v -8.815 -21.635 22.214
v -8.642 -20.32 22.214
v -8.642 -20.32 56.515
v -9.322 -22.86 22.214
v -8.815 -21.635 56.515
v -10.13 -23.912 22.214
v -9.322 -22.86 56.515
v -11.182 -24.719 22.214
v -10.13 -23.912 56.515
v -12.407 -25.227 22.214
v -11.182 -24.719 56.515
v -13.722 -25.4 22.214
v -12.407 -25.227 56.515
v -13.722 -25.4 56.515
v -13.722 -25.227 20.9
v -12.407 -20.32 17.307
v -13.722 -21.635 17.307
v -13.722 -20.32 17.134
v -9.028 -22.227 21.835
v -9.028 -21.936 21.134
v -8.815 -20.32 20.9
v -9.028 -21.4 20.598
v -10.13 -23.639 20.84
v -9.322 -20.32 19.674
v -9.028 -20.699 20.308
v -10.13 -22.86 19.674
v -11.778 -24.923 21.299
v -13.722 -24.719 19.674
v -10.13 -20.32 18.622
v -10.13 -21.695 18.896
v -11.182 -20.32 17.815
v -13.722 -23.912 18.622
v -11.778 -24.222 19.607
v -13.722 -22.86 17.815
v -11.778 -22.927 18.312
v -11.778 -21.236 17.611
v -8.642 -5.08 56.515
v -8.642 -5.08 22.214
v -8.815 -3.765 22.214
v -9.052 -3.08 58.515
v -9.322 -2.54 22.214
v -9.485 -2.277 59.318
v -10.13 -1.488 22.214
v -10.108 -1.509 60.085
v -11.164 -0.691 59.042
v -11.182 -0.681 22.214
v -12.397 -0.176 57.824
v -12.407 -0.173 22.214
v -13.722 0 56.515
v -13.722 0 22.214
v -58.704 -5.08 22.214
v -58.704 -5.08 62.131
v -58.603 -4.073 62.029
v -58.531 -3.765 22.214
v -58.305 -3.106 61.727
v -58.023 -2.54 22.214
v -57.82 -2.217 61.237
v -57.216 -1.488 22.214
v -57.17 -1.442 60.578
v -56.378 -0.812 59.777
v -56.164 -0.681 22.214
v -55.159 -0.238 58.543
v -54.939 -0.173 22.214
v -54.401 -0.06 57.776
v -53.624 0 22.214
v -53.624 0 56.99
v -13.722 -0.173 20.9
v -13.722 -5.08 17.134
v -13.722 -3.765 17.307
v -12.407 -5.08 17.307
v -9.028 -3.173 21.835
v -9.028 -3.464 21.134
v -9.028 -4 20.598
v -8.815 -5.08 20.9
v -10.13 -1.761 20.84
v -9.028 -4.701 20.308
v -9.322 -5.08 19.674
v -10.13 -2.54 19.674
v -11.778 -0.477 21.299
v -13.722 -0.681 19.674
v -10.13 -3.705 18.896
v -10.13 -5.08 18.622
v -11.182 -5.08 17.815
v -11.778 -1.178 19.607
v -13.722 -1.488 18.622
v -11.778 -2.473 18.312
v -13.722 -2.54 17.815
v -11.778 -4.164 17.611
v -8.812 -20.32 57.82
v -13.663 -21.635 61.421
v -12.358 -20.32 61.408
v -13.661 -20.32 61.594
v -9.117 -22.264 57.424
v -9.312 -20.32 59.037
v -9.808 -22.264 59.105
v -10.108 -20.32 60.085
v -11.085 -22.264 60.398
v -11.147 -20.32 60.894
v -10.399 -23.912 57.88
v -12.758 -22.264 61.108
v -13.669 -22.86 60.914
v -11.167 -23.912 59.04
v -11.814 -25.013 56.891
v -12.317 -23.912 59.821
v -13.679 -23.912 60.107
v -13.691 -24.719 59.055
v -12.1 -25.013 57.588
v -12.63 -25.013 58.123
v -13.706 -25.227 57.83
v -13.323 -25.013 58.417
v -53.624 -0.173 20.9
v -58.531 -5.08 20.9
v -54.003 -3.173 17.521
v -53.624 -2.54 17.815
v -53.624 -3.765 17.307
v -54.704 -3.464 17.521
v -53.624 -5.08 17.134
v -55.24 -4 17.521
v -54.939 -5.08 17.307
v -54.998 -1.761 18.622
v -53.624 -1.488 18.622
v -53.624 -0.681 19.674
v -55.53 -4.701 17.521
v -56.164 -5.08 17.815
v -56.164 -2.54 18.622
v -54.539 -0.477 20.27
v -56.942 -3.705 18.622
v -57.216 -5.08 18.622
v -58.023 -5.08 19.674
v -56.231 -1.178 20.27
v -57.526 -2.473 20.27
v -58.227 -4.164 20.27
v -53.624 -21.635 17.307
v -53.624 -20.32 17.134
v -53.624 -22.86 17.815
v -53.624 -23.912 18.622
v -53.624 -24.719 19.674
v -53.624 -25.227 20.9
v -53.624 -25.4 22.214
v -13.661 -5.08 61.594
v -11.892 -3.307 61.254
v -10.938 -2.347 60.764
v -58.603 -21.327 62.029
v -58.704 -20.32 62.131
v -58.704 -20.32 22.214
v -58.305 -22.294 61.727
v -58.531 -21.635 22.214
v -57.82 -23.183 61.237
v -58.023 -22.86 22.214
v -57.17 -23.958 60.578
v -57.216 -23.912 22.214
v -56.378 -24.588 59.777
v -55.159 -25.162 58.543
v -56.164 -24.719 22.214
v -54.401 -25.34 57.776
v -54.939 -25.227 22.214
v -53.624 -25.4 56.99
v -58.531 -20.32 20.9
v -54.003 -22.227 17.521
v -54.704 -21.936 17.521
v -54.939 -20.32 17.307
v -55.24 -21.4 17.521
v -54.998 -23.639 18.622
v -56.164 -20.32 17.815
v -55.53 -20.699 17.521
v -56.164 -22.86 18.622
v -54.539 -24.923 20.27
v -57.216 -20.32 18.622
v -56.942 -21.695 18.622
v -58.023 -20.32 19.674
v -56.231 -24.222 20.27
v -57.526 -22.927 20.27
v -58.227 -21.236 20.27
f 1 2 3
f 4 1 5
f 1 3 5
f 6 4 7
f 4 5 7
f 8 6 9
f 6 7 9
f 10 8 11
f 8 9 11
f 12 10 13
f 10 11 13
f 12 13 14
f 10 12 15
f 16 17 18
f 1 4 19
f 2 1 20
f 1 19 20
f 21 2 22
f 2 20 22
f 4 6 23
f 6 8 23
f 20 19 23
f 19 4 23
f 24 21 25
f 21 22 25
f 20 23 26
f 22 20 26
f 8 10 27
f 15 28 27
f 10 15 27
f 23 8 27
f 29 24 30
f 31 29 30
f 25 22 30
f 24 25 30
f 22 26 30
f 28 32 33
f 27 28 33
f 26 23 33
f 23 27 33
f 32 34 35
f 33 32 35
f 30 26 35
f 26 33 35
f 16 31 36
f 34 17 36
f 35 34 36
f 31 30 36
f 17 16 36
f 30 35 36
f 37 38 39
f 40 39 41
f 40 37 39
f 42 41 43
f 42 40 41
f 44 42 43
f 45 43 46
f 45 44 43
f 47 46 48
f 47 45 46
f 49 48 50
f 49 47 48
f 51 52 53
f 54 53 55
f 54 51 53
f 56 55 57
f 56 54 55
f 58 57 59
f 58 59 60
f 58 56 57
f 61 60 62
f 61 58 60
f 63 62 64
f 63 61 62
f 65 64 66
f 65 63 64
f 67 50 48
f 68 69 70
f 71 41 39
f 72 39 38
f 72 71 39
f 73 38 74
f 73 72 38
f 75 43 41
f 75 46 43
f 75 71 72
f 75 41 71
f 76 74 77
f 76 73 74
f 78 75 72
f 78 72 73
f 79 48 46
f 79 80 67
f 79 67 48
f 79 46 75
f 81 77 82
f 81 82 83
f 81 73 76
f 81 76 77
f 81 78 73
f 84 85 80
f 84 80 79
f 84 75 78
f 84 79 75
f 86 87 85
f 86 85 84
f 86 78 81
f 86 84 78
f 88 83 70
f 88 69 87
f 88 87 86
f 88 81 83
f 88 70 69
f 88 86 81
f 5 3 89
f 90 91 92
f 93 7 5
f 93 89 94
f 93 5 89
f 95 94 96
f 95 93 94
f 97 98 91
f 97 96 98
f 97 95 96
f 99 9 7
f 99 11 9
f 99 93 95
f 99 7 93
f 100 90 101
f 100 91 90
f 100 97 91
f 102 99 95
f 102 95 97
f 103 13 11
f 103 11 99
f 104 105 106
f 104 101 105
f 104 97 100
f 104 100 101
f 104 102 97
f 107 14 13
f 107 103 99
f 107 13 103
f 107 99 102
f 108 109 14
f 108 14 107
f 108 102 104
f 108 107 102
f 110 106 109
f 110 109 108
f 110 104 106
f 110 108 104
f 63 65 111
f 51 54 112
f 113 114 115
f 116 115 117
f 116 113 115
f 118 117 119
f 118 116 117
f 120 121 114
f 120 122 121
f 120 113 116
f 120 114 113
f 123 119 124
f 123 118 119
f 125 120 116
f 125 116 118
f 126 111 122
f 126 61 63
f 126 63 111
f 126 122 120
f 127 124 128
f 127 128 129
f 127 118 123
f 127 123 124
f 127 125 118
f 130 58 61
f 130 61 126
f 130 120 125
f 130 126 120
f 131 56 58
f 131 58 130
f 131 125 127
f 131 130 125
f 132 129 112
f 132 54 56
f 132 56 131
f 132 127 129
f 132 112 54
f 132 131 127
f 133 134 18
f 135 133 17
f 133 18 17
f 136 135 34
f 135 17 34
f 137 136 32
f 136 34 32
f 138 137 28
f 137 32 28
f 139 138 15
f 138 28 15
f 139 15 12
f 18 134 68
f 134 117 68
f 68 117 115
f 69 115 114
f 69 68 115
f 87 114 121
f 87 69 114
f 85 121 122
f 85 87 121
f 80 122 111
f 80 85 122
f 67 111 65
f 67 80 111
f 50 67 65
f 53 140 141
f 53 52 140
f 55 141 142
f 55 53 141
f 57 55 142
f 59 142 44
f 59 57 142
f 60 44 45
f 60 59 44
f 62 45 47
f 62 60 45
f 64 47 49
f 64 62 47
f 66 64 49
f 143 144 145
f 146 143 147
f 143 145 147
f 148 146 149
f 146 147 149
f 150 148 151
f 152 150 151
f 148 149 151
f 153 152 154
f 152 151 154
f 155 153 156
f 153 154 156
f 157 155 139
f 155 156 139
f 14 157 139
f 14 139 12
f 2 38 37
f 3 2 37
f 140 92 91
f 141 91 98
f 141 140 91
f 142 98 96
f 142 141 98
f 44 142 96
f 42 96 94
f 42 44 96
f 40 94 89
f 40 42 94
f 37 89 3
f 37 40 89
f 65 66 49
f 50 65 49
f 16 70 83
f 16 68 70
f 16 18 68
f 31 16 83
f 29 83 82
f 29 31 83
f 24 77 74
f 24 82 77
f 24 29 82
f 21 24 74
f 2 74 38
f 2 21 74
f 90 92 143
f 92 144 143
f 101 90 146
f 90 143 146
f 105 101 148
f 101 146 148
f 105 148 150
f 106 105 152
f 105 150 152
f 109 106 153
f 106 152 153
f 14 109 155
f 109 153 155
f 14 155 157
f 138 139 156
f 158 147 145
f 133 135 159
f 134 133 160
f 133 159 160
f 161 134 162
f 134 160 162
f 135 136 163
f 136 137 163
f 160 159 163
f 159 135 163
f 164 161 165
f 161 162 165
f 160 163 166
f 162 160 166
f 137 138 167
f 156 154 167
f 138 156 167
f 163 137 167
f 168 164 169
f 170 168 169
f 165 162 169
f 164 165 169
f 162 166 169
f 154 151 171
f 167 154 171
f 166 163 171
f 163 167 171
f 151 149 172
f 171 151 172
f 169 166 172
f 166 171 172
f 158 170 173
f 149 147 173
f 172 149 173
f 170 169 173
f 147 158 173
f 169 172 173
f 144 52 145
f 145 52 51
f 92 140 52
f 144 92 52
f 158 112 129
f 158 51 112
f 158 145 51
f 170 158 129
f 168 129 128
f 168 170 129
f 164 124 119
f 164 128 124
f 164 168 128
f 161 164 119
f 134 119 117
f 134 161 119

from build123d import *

# Parameters (mm, degrees)
F1_DEPTH    = 25.4
F2_R        = 5.08
F3_T1_DEPTH = 27.7897108637
F3_T6_DEPTH = 5.1816


# Not quite as in the source:
# - a fillet or chamfer that OpenCascade refuses, or shapes differently, is made with other operations: its cross-section is extruded or revolved along the edge and cut away or added


with BuildPart() as f1:
    # F0 (on Front) → F1 (new body)
    with BuildSketch(Plane.XZ):
        Polygon((-8.6416769773, 61.5346953273), (-58.7037988007, 62.1306672692), (-58.7037988007, 17.1343572438), (-8.6416769773, 17.1343572438), align=None)
    extrude(amount=F1_DEPTH)

    # F2
    f2_edges = [f1.edges().sort_by_distance(p)[0] for p in [
        (-33.672738, -25.4, 61.832681),
        (-58.703799, -25.4, 39.632512),
        (-33.672738, -25.4, 17.134357),
        (-8.641677, -25.4, 39.334526),
        (-33.672738, 0, 61.832681),
        (-58.703799, 0, 39.632512),
        (-33.672738, 0, 17.134357),
        (-8.641677, 0, 39.334526),
        (-58.703799, -12.7, 17.134357),
        (-8.641677, -12.7, 17.134357),
    ]]
    fillet(f2_edges, radius=F2_R)

    # F3: fillet of radius 5.08 on 5 edges, made by hand

    # F3_s2 → F3_t1 (cut)
    with BuildSketch(Plane.XZ.offset(-7.4697108637)):
        with BuildLine():
            ThreePointArc((-13.6612056499, 61.5944510496), (-10.1082579355, 60.0854695805), (-8.6416769773, 56.5148109818))
            Line((-8.6416769773, 56.5148109818), (-8.6416769773, 61.5346953273))
            Line((-8.6416769773, 61.5346953273), (-13.6612056499, 61.5944510496))
        make_face()
    extrude(amount=F3_T1_DEPTH, mode=Mode.SUBTRACT)


with BuildPart() as f3_tool4:
    # F3_s5 → F3_t6 (new body)
    with BuildSketch(Plane.XZ.offset(20.32)):
        Polygon((-13.7216769773, 56.5148109818), (-13.6599962234, 61.696043851), (-8.5400769773, 61.6350930142), (-8.5400769773, 56.5148109818), align=None)
    extrude(amount=F3_T6_DEPTH)

    # F3_s7 → F3_t8 (revolve, cut)
    with BuildSketch(Plane(origin=(-13.7216769773, -20.32, 56.5148109818), x_dir=(-0.711302961, 0, -0.7028855509), z_dir=(-0.7028855509, 0, 0.711302961))):
        with BuildLine():
            ThreePointArc((0, -5.08), (5.08, 0), (0, 5.08))
            Line((0, 5.08), (0, -5.08))
        make_face()
    revolve(axis=Axis((-13.7216769773, -20.32, 56.5148109818), (0, -1, 0)), mode=Mode.SUBTRACT)


with BuildPart() as f1_1:
    add(f1.part)

    # F3_t3: cut F3_tool4
    add(f3_tool4.part, mode=Mode.SUBTRACT)


solid = f1_1.part
